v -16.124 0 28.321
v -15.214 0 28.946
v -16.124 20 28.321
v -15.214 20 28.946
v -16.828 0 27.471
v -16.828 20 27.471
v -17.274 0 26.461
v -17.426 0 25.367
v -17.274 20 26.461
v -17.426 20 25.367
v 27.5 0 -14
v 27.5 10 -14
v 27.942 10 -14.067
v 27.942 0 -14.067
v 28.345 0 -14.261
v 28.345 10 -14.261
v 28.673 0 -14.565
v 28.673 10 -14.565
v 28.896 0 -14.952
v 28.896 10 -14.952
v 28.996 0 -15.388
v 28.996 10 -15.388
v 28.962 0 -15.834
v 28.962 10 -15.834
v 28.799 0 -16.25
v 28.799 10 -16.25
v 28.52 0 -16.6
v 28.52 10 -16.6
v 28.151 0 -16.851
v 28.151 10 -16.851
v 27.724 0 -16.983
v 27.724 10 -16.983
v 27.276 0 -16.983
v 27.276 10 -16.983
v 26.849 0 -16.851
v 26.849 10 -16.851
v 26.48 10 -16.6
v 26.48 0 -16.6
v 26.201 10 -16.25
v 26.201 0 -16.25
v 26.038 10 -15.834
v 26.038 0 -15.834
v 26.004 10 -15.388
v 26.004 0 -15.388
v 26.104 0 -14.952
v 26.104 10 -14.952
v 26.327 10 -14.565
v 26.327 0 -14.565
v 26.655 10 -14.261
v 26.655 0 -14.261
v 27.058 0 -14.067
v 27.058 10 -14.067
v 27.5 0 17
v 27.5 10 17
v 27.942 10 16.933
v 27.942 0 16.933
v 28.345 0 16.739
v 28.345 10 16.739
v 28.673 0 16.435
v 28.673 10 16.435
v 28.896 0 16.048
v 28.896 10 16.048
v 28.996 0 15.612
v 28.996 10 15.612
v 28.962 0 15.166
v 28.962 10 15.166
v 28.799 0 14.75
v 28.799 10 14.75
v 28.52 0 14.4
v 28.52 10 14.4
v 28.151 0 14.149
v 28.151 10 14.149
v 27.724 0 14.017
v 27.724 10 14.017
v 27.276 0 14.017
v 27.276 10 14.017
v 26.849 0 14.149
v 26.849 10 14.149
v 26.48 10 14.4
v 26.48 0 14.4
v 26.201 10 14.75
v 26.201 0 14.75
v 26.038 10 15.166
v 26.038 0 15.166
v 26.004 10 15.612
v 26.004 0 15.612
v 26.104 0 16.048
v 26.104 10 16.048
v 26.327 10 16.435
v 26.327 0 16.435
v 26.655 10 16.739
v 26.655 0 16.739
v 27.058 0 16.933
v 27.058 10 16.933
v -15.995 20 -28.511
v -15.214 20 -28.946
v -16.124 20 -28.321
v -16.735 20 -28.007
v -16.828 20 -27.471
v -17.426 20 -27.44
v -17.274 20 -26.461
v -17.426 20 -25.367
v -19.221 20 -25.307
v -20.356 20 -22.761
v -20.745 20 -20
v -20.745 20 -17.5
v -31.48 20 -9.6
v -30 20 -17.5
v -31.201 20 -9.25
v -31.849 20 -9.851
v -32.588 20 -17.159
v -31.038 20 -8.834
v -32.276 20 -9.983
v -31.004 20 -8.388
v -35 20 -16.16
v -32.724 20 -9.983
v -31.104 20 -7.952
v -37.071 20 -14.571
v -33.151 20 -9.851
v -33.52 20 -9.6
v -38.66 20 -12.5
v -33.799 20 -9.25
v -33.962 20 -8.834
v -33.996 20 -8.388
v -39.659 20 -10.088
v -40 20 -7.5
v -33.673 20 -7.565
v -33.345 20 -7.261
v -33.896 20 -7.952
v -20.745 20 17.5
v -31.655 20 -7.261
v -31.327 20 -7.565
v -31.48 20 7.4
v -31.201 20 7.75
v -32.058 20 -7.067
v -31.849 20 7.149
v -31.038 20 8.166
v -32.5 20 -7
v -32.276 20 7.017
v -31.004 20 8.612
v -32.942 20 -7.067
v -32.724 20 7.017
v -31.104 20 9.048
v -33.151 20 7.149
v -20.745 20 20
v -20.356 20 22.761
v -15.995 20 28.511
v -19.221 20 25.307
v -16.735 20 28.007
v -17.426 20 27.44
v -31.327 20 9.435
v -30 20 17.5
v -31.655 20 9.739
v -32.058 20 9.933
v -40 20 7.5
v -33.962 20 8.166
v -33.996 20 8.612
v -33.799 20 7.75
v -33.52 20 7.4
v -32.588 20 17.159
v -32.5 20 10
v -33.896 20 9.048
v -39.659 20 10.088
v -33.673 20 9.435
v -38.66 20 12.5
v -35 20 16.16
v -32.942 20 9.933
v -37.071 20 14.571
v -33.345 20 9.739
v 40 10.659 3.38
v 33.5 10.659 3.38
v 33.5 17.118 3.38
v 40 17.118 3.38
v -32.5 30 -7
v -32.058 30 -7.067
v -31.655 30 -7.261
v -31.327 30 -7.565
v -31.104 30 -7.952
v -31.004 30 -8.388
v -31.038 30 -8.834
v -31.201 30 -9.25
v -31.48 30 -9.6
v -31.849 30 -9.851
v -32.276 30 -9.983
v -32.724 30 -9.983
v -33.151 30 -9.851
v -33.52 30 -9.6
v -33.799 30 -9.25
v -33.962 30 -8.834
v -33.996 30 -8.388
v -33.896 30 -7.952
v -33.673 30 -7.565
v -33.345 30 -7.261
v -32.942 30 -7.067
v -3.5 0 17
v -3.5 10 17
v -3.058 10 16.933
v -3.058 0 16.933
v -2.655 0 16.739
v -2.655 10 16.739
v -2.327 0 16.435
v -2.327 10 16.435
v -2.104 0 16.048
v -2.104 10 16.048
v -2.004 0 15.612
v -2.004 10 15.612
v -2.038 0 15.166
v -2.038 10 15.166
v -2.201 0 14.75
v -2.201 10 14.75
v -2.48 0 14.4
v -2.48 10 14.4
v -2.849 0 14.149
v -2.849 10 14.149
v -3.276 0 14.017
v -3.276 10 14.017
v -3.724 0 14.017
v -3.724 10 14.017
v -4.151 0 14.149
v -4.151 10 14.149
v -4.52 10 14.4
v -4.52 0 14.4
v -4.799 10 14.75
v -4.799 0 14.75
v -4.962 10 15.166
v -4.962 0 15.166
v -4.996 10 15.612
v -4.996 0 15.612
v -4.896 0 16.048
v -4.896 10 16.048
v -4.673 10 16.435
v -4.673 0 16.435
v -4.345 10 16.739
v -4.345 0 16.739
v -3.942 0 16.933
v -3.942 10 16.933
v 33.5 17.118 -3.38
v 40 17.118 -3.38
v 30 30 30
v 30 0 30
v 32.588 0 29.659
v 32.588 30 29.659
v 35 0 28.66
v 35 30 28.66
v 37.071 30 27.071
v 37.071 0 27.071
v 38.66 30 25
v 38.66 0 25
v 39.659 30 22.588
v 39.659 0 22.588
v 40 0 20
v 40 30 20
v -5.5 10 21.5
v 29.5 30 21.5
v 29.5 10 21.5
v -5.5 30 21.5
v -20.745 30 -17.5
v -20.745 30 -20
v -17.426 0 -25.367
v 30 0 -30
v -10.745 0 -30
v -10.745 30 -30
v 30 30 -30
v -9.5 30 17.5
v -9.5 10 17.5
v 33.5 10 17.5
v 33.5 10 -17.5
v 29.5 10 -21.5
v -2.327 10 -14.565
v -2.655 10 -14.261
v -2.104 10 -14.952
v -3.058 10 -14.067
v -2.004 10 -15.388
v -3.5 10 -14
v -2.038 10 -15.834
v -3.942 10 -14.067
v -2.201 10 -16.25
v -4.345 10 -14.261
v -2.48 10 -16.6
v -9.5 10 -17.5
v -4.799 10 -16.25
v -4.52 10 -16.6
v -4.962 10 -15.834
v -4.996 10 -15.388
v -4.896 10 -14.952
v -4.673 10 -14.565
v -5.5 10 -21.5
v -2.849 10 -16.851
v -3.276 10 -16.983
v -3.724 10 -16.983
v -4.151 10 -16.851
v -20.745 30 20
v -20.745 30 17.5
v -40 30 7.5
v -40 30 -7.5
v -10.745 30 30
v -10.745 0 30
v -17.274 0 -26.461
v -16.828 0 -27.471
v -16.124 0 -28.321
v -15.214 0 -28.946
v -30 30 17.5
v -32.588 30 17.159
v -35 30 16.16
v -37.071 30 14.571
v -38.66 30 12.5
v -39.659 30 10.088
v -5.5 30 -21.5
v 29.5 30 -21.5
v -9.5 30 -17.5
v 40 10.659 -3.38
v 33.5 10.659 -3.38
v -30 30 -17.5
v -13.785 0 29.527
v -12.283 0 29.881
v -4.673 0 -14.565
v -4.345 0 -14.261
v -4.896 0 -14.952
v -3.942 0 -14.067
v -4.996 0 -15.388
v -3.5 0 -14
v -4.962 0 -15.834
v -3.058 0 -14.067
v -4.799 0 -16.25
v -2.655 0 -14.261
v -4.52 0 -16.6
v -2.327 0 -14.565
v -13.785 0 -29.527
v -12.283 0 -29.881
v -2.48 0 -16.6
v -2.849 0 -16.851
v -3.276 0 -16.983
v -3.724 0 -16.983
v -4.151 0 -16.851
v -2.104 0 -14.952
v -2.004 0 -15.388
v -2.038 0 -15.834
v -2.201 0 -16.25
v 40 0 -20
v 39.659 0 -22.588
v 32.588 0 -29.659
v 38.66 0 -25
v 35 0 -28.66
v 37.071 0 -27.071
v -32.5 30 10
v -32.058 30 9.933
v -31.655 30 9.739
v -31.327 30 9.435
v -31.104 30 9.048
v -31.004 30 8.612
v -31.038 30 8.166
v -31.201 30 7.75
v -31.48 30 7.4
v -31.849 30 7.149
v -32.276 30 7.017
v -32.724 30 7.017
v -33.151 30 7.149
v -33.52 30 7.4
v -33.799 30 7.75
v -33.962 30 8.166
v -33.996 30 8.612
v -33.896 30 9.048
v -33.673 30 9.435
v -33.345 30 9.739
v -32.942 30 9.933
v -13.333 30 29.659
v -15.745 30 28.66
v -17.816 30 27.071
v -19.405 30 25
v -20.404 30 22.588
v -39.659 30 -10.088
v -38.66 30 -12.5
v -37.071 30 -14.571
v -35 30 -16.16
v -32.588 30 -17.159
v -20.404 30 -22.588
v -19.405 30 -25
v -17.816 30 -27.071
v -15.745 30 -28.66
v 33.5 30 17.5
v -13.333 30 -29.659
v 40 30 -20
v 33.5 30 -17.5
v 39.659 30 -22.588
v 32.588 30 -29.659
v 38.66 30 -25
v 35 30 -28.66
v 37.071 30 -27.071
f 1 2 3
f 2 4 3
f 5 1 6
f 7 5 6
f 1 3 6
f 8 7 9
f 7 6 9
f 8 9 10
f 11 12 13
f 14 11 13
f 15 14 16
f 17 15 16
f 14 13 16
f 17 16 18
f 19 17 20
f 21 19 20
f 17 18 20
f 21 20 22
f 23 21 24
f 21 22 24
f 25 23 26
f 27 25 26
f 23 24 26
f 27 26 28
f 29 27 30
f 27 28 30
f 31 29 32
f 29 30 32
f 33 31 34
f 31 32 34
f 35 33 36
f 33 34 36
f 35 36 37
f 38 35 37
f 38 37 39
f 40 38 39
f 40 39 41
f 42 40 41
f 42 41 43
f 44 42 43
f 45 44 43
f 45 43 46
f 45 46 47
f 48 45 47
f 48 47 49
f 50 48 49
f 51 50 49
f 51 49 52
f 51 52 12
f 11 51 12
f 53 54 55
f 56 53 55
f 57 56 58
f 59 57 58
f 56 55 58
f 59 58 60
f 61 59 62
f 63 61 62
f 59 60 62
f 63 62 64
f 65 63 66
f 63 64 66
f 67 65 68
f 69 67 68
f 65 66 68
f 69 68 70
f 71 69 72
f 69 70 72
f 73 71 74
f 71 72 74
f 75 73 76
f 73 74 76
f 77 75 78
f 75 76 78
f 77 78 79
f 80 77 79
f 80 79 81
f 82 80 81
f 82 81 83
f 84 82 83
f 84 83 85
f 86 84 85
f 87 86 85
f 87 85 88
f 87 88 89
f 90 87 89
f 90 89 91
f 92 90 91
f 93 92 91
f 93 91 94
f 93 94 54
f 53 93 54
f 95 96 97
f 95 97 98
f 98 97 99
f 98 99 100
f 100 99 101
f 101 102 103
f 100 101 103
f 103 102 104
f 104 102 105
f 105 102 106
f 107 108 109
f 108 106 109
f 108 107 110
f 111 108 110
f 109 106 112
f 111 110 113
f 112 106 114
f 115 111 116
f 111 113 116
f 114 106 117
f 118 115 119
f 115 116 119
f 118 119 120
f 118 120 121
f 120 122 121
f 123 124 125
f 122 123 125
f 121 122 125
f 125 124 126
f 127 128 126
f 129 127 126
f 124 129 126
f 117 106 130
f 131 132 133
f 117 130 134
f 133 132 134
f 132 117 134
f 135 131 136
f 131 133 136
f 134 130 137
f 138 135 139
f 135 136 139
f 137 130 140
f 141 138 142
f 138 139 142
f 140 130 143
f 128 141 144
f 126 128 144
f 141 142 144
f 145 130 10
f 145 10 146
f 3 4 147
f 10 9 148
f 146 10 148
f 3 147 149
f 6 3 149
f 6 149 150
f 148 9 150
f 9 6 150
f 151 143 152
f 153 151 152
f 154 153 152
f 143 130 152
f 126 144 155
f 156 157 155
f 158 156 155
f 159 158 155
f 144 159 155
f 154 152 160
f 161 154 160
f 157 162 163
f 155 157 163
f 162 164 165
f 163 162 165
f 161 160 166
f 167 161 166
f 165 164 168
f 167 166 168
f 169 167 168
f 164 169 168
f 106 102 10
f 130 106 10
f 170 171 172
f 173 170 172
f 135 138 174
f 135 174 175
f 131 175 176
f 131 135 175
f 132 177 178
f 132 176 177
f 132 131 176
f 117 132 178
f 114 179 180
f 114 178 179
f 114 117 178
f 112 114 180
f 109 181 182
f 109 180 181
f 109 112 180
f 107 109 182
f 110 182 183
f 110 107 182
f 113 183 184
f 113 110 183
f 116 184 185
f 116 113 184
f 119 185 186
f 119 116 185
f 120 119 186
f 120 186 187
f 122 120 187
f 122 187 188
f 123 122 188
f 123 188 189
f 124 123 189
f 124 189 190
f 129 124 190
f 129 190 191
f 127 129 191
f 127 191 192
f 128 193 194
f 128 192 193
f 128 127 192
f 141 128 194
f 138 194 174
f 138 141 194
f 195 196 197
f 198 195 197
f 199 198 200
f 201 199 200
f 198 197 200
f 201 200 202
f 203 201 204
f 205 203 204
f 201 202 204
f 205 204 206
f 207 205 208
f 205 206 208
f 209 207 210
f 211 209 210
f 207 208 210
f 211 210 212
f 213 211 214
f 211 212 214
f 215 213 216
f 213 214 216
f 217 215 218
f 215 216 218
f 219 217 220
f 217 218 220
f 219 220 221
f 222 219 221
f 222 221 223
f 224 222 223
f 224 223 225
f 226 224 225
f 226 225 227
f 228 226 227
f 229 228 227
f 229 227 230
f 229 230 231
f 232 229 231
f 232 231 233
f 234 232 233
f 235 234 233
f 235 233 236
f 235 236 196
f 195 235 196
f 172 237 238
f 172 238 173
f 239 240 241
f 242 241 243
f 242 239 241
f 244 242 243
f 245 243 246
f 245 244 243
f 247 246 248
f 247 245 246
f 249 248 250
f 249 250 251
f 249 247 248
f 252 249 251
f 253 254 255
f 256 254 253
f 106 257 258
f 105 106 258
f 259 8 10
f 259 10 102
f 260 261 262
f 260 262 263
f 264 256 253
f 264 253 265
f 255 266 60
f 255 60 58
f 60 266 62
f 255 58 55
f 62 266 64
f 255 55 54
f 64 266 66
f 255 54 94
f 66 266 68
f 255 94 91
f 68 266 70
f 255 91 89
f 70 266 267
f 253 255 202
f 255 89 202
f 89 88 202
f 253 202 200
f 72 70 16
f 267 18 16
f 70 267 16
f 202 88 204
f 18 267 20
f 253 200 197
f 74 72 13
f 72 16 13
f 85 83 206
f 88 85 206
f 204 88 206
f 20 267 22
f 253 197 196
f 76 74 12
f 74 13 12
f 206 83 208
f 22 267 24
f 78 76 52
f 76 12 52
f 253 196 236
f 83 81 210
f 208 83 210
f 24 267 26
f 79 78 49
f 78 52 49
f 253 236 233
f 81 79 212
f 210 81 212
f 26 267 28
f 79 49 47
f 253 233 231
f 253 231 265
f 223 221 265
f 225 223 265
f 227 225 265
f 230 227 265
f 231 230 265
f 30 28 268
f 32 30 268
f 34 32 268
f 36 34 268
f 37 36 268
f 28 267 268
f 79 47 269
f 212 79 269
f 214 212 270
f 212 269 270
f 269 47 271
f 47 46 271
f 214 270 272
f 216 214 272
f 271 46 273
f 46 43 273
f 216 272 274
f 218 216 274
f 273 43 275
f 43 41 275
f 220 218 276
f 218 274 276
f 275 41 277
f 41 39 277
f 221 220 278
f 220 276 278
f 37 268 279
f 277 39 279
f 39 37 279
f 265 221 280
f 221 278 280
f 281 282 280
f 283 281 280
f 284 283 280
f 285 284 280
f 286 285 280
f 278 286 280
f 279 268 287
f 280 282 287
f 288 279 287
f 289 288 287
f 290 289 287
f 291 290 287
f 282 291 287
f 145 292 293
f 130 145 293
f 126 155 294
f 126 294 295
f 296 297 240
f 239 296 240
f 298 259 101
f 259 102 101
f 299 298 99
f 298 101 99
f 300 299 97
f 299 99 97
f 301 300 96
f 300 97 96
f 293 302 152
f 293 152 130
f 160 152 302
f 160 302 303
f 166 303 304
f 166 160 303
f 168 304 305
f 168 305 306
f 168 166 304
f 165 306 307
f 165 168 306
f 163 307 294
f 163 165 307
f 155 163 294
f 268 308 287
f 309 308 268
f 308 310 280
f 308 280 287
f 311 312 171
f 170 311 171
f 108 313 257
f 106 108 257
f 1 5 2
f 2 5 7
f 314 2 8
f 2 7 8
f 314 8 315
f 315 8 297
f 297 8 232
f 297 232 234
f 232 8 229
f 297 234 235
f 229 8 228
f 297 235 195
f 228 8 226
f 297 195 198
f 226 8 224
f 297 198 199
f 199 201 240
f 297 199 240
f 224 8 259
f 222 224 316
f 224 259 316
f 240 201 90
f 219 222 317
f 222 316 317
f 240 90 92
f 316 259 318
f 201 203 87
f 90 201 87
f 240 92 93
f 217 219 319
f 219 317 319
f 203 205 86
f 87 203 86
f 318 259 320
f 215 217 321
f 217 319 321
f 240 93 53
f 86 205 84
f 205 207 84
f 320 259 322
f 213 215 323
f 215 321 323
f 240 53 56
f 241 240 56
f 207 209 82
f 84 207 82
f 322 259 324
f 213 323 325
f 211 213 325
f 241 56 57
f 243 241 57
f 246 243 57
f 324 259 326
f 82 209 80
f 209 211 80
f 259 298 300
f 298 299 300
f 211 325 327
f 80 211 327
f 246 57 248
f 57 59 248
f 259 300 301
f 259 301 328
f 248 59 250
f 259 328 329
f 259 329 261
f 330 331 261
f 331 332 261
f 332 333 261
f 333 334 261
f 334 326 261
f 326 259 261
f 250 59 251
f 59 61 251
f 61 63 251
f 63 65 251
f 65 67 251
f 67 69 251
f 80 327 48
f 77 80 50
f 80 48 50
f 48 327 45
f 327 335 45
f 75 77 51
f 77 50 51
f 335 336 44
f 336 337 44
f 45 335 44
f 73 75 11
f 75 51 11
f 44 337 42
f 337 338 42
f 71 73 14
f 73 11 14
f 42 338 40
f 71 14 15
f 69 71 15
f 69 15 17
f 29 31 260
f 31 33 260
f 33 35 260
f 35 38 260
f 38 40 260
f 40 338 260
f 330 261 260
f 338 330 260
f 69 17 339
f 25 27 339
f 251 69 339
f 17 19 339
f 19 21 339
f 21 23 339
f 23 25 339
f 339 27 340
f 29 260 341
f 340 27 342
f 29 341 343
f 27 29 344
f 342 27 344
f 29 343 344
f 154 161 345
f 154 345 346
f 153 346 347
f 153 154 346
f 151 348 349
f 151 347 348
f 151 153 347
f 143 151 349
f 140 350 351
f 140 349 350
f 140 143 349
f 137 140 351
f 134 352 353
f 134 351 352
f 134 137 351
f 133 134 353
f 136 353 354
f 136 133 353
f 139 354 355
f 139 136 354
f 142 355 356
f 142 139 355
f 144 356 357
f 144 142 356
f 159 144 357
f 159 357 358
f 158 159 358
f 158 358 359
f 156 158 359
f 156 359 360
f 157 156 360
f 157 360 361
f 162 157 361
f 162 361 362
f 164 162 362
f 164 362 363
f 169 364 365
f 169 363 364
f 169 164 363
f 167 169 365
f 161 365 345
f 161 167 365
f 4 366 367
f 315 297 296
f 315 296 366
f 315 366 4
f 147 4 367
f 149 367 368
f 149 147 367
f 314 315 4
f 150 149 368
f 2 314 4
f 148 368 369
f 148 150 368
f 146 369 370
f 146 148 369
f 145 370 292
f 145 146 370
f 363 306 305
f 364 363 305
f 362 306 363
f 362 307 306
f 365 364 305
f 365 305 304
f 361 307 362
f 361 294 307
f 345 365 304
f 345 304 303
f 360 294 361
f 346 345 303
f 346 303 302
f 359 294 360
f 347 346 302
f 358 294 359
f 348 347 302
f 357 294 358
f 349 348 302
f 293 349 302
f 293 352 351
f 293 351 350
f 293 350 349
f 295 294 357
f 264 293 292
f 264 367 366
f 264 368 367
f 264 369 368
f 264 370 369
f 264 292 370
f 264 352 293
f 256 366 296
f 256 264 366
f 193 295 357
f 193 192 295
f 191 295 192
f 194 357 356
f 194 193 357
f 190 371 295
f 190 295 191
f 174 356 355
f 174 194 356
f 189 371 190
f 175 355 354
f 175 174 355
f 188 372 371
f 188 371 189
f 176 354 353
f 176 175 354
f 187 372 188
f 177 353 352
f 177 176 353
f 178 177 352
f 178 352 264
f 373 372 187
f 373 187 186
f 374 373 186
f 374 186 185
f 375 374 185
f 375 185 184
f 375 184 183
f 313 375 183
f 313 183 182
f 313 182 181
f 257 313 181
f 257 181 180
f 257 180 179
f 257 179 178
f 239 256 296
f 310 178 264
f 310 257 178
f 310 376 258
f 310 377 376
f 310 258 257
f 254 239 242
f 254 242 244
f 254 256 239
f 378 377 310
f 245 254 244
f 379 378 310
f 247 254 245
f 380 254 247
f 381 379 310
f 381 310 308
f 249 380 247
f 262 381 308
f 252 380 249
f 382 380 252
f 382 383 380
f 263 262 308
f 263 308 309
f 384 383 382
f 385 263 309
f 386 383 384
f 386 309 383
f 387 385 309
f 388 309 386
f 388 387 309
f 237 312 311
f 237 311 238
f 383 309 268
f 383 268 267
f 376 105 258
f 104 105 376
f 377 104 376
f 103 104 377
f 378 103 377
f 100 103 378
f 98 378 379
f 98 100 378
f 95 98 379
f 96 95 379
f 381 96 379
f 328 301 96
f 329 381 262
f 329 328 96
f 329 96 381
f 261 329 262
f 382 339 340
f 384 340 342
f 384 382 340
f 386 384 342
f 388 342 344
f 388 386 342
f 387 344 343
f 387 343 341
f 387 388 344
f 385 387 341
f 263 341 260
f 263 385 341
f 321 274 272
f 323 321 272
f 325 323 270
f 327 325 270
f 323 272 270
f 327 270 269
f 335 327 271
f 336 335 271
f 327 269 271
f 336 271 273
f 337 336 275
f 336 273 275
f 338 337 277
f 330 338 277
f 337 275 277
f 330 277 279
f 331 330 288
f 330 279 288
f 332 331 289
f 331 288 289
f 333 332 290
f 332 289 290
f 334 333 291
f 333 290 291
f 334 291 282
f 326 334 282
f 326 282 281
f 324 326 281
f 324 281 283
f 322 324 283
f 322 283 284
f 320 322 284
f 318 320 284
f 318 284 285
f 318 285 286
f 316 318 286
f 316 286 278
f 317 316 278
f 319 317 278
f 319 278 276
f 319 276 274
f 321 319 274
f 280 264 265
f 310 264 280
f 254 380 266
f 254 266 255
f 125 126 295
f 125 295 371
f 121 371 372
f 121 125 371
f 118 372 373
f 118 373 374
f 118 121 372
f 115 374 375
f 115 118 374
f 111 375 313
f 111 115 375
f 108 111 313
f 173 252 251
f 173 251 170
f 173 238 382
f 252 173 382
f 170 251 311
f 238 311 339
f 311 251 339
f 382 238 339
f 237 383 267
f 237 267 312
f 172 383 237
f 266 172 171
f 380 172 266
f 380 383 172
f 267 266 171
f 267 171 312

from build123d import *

# Parameters (mm, degrees)
SKETCH1_W               = 80
SKETCH1_H               = 60
BOSS_EXTRUDE1_DEPTH     = 30
FILLET1_R               = 10
SKETCH2_R               = 1.5
CUT_EXTRUDE1_DEPTH      = 59.309518948
CUT_EXTRUDE2_DEPTH      = 20
CUT_EXTRUDE3_DEPTH      = 59.309518948
CUT_EXTRUDE3_DEPTH_BACK = 59.309518948
SKETCH4_R               = 1.5
SKETCH7_W               = 19.255318266
SKETCH7_H               = 12.5
CUT_EXTRUDE5_DEPTH      = 59.309518948
FILLET2_R               = 10
CUT_EXTRUDE6_DEPTH      = 20
FILLET4_R               = 4
SKETCH9_W               = 6.759025402
SKETCH9_H               = 6.458754369
CUT_EXTRUDE7_DEPTH      = 85.866070959


with BuildPart() as part:
    # Sketch1 → Boss-Extrude1 (new body)
    with BuildSketch(Plane(origin=(0, 0, 0), x_dir=(1, 0, 0), z_dir=(0, 1, 0))):
        Rectangle(SKETCH1_W, SKETCH1_H)
    extrude(amount=BOSS_EXTRUDE1_DEPTH)

    # Fillet1
    fillet1_edges = [part.edges().sort_by_distance(p)[0] for p in [
        (40, 15, 30),
        (40, 15, -30),
    ]]
    fillet(fillet1_edges, radius=FILLET1_R)

    # Sketch2 → Cut-Extrude1 (cut, through all)
    with BuildSketch(Plane(origin=(0, 30, 0), x_dir=(1, 0, 0), z_dir=(0, 1, 0))):
        with Locations(Location((-3.5, 15.5, 0), (0, 0, 270))):
            Circle(SKETCH2_R)
        with Locations(Location((27.5, 15.5, 0), (0, 0, 270))):
            Circle(SKETCH2_R)
        with Locations(Location((-3.5, -15.5, 0), (0, 0, 270))):
            Circle(SKETCH2_R)
        with Locations(Location((27.5, -15.5, 0), (0, 0, 270))):
            Circle(SKETCH2_R)
    extrude(amount=-CUT_EXTRUDE1_DEPTH, mode=Mode.SUBTRACT)

    # Sketch3 → Cut-Extrude2 (cut)
    with BuildSketch(Plane(origin=(0, 30, 0), x_dir=(1, 0, 0), z_dir=(0, 1, 0))):
        Polygon((-9.5, 17.5), (-5.5, 21.5), (29.5, 21.5), (33.5, 17.5), (33.5, -17.5), (29.5, -21.5), (-5.5, -21.5), (-9.5, -17.5), align=None)
    extrude(amount=-CUT_EXTRUDE2_DEPTH, mode=Mode.SUBTRACT)

    # Sketch4 → Cut-Extrude3 (cut, two sides: drawn at the far end of the back side and taken through both)
    with BuildSketch(Plane(origin=(0, 30, 0), x_dir=(1, 0, 0), z_dir=(0, 1, 0)).offset(-CUT_EXTRUDE3_DEPTH_BACK)):
        with Locations(Location((-32.5, 8.5, 0), (0, 0, 270))):
            Circle(SKETCH4_R)
        with Locations(Location((-32.5, -8.5, 0), (0, 0, 270))):
            Circle(SKETCH4_R)
    extrude(amount=CUT_EXTRUDE3_DEPTH + CUT_EXTRUDE3_DEPTH_BACK, mode=Mode.SUBTRACT)

    # Sketch7 → Cut-Extrude5 (cut, through all)
    with BuildSketch(Plane(origin=(0, 30, 0), x_dir=(1, 0, 0), z_dir=(0, 1, 0))):
        with Locations((-30.372340867, 23.75)):
            Rectangle(SKETCH7_W, SKETCH7_H)
        with Locations((-30.372340867, -23.75)):
            Rectangle(SKETCH7_W, SKETCH7_H)
    extrude(amount=-CUT_EXTRUDE5_DEPTH, mode=Mode.SUBTRACT)

    # Fillet2
    fillet2_edges = [part.edges().sort_by_distance(p)[0] for p in [
        (-20.744681734, 15, 30),
        (-40, 15, 17.5),
        (-20.744681734, 15, -30),
        (-40, 15, -17.5),
    ]]
    fillet(fillet2_edges, radius=FILLET2_R)

    # Sketch8 → Cut-Extrude6 (cut)
    with BuildSketch(Plane.XZ):
        with BuildLine():
            Line((-17.426212782, 27.440238091), (-17.426212782, -27.440238091))
            ThreePointArc((-17.426212782, -27.440238091), (-19.877460897, -24.073370197), (-20.744681734, -20))
            Line((-20.744681734, -20), (-20.744681734, -17.5))
            Line((-20.744681734, -17.5), (-30, -17.5))
            ThreePointArc((-30, -17.5), (-37.071067812, -14.571067812), (-40, -7.5))
            Line((-40, -7.5), (-40, 7.5))
            ThreePointArc((-40, 7.5), (-37.071067812, 14.571067812), (-30, 17.5))
            Line((-30, 17.5), (-20.744681734, 17.5))
            Line((-20.744681734, 17.5), (-20.744681734, 20))
            ThreePointArc((-20.744681734, 20), (-19.877460897, 24.073370197), (-17.426212782, 27.440238091))
        make_face()
    extrude(amount=-CUT_EXTRUDE6_DEPTH, mode=Mode.SUBTRACT)

    # Fillet4
    fillet4_edges = [part.edges().sort_by_distance(p)[0] for p in [
        (-17.426212782, 10, 27.440238091),
        (-17.426212782, 10, -27.440238091),
    ]]
    fillet(fillet4_edges, radius=FILLET4_R)

    # Sketch9 → Cut-Extrude7 (cut, through all)
    with BuildSketch(Plane.ZY.offset(-33.5)):
        with Locations((0, 13.888622085)):
            Rectangle(SKETCH9_W, SKETCH9_H)
    extrude(amount=-CUT_EXTRUDE7_DEPTH, mode=Mode.SUBTRACT)


solid = part.part
